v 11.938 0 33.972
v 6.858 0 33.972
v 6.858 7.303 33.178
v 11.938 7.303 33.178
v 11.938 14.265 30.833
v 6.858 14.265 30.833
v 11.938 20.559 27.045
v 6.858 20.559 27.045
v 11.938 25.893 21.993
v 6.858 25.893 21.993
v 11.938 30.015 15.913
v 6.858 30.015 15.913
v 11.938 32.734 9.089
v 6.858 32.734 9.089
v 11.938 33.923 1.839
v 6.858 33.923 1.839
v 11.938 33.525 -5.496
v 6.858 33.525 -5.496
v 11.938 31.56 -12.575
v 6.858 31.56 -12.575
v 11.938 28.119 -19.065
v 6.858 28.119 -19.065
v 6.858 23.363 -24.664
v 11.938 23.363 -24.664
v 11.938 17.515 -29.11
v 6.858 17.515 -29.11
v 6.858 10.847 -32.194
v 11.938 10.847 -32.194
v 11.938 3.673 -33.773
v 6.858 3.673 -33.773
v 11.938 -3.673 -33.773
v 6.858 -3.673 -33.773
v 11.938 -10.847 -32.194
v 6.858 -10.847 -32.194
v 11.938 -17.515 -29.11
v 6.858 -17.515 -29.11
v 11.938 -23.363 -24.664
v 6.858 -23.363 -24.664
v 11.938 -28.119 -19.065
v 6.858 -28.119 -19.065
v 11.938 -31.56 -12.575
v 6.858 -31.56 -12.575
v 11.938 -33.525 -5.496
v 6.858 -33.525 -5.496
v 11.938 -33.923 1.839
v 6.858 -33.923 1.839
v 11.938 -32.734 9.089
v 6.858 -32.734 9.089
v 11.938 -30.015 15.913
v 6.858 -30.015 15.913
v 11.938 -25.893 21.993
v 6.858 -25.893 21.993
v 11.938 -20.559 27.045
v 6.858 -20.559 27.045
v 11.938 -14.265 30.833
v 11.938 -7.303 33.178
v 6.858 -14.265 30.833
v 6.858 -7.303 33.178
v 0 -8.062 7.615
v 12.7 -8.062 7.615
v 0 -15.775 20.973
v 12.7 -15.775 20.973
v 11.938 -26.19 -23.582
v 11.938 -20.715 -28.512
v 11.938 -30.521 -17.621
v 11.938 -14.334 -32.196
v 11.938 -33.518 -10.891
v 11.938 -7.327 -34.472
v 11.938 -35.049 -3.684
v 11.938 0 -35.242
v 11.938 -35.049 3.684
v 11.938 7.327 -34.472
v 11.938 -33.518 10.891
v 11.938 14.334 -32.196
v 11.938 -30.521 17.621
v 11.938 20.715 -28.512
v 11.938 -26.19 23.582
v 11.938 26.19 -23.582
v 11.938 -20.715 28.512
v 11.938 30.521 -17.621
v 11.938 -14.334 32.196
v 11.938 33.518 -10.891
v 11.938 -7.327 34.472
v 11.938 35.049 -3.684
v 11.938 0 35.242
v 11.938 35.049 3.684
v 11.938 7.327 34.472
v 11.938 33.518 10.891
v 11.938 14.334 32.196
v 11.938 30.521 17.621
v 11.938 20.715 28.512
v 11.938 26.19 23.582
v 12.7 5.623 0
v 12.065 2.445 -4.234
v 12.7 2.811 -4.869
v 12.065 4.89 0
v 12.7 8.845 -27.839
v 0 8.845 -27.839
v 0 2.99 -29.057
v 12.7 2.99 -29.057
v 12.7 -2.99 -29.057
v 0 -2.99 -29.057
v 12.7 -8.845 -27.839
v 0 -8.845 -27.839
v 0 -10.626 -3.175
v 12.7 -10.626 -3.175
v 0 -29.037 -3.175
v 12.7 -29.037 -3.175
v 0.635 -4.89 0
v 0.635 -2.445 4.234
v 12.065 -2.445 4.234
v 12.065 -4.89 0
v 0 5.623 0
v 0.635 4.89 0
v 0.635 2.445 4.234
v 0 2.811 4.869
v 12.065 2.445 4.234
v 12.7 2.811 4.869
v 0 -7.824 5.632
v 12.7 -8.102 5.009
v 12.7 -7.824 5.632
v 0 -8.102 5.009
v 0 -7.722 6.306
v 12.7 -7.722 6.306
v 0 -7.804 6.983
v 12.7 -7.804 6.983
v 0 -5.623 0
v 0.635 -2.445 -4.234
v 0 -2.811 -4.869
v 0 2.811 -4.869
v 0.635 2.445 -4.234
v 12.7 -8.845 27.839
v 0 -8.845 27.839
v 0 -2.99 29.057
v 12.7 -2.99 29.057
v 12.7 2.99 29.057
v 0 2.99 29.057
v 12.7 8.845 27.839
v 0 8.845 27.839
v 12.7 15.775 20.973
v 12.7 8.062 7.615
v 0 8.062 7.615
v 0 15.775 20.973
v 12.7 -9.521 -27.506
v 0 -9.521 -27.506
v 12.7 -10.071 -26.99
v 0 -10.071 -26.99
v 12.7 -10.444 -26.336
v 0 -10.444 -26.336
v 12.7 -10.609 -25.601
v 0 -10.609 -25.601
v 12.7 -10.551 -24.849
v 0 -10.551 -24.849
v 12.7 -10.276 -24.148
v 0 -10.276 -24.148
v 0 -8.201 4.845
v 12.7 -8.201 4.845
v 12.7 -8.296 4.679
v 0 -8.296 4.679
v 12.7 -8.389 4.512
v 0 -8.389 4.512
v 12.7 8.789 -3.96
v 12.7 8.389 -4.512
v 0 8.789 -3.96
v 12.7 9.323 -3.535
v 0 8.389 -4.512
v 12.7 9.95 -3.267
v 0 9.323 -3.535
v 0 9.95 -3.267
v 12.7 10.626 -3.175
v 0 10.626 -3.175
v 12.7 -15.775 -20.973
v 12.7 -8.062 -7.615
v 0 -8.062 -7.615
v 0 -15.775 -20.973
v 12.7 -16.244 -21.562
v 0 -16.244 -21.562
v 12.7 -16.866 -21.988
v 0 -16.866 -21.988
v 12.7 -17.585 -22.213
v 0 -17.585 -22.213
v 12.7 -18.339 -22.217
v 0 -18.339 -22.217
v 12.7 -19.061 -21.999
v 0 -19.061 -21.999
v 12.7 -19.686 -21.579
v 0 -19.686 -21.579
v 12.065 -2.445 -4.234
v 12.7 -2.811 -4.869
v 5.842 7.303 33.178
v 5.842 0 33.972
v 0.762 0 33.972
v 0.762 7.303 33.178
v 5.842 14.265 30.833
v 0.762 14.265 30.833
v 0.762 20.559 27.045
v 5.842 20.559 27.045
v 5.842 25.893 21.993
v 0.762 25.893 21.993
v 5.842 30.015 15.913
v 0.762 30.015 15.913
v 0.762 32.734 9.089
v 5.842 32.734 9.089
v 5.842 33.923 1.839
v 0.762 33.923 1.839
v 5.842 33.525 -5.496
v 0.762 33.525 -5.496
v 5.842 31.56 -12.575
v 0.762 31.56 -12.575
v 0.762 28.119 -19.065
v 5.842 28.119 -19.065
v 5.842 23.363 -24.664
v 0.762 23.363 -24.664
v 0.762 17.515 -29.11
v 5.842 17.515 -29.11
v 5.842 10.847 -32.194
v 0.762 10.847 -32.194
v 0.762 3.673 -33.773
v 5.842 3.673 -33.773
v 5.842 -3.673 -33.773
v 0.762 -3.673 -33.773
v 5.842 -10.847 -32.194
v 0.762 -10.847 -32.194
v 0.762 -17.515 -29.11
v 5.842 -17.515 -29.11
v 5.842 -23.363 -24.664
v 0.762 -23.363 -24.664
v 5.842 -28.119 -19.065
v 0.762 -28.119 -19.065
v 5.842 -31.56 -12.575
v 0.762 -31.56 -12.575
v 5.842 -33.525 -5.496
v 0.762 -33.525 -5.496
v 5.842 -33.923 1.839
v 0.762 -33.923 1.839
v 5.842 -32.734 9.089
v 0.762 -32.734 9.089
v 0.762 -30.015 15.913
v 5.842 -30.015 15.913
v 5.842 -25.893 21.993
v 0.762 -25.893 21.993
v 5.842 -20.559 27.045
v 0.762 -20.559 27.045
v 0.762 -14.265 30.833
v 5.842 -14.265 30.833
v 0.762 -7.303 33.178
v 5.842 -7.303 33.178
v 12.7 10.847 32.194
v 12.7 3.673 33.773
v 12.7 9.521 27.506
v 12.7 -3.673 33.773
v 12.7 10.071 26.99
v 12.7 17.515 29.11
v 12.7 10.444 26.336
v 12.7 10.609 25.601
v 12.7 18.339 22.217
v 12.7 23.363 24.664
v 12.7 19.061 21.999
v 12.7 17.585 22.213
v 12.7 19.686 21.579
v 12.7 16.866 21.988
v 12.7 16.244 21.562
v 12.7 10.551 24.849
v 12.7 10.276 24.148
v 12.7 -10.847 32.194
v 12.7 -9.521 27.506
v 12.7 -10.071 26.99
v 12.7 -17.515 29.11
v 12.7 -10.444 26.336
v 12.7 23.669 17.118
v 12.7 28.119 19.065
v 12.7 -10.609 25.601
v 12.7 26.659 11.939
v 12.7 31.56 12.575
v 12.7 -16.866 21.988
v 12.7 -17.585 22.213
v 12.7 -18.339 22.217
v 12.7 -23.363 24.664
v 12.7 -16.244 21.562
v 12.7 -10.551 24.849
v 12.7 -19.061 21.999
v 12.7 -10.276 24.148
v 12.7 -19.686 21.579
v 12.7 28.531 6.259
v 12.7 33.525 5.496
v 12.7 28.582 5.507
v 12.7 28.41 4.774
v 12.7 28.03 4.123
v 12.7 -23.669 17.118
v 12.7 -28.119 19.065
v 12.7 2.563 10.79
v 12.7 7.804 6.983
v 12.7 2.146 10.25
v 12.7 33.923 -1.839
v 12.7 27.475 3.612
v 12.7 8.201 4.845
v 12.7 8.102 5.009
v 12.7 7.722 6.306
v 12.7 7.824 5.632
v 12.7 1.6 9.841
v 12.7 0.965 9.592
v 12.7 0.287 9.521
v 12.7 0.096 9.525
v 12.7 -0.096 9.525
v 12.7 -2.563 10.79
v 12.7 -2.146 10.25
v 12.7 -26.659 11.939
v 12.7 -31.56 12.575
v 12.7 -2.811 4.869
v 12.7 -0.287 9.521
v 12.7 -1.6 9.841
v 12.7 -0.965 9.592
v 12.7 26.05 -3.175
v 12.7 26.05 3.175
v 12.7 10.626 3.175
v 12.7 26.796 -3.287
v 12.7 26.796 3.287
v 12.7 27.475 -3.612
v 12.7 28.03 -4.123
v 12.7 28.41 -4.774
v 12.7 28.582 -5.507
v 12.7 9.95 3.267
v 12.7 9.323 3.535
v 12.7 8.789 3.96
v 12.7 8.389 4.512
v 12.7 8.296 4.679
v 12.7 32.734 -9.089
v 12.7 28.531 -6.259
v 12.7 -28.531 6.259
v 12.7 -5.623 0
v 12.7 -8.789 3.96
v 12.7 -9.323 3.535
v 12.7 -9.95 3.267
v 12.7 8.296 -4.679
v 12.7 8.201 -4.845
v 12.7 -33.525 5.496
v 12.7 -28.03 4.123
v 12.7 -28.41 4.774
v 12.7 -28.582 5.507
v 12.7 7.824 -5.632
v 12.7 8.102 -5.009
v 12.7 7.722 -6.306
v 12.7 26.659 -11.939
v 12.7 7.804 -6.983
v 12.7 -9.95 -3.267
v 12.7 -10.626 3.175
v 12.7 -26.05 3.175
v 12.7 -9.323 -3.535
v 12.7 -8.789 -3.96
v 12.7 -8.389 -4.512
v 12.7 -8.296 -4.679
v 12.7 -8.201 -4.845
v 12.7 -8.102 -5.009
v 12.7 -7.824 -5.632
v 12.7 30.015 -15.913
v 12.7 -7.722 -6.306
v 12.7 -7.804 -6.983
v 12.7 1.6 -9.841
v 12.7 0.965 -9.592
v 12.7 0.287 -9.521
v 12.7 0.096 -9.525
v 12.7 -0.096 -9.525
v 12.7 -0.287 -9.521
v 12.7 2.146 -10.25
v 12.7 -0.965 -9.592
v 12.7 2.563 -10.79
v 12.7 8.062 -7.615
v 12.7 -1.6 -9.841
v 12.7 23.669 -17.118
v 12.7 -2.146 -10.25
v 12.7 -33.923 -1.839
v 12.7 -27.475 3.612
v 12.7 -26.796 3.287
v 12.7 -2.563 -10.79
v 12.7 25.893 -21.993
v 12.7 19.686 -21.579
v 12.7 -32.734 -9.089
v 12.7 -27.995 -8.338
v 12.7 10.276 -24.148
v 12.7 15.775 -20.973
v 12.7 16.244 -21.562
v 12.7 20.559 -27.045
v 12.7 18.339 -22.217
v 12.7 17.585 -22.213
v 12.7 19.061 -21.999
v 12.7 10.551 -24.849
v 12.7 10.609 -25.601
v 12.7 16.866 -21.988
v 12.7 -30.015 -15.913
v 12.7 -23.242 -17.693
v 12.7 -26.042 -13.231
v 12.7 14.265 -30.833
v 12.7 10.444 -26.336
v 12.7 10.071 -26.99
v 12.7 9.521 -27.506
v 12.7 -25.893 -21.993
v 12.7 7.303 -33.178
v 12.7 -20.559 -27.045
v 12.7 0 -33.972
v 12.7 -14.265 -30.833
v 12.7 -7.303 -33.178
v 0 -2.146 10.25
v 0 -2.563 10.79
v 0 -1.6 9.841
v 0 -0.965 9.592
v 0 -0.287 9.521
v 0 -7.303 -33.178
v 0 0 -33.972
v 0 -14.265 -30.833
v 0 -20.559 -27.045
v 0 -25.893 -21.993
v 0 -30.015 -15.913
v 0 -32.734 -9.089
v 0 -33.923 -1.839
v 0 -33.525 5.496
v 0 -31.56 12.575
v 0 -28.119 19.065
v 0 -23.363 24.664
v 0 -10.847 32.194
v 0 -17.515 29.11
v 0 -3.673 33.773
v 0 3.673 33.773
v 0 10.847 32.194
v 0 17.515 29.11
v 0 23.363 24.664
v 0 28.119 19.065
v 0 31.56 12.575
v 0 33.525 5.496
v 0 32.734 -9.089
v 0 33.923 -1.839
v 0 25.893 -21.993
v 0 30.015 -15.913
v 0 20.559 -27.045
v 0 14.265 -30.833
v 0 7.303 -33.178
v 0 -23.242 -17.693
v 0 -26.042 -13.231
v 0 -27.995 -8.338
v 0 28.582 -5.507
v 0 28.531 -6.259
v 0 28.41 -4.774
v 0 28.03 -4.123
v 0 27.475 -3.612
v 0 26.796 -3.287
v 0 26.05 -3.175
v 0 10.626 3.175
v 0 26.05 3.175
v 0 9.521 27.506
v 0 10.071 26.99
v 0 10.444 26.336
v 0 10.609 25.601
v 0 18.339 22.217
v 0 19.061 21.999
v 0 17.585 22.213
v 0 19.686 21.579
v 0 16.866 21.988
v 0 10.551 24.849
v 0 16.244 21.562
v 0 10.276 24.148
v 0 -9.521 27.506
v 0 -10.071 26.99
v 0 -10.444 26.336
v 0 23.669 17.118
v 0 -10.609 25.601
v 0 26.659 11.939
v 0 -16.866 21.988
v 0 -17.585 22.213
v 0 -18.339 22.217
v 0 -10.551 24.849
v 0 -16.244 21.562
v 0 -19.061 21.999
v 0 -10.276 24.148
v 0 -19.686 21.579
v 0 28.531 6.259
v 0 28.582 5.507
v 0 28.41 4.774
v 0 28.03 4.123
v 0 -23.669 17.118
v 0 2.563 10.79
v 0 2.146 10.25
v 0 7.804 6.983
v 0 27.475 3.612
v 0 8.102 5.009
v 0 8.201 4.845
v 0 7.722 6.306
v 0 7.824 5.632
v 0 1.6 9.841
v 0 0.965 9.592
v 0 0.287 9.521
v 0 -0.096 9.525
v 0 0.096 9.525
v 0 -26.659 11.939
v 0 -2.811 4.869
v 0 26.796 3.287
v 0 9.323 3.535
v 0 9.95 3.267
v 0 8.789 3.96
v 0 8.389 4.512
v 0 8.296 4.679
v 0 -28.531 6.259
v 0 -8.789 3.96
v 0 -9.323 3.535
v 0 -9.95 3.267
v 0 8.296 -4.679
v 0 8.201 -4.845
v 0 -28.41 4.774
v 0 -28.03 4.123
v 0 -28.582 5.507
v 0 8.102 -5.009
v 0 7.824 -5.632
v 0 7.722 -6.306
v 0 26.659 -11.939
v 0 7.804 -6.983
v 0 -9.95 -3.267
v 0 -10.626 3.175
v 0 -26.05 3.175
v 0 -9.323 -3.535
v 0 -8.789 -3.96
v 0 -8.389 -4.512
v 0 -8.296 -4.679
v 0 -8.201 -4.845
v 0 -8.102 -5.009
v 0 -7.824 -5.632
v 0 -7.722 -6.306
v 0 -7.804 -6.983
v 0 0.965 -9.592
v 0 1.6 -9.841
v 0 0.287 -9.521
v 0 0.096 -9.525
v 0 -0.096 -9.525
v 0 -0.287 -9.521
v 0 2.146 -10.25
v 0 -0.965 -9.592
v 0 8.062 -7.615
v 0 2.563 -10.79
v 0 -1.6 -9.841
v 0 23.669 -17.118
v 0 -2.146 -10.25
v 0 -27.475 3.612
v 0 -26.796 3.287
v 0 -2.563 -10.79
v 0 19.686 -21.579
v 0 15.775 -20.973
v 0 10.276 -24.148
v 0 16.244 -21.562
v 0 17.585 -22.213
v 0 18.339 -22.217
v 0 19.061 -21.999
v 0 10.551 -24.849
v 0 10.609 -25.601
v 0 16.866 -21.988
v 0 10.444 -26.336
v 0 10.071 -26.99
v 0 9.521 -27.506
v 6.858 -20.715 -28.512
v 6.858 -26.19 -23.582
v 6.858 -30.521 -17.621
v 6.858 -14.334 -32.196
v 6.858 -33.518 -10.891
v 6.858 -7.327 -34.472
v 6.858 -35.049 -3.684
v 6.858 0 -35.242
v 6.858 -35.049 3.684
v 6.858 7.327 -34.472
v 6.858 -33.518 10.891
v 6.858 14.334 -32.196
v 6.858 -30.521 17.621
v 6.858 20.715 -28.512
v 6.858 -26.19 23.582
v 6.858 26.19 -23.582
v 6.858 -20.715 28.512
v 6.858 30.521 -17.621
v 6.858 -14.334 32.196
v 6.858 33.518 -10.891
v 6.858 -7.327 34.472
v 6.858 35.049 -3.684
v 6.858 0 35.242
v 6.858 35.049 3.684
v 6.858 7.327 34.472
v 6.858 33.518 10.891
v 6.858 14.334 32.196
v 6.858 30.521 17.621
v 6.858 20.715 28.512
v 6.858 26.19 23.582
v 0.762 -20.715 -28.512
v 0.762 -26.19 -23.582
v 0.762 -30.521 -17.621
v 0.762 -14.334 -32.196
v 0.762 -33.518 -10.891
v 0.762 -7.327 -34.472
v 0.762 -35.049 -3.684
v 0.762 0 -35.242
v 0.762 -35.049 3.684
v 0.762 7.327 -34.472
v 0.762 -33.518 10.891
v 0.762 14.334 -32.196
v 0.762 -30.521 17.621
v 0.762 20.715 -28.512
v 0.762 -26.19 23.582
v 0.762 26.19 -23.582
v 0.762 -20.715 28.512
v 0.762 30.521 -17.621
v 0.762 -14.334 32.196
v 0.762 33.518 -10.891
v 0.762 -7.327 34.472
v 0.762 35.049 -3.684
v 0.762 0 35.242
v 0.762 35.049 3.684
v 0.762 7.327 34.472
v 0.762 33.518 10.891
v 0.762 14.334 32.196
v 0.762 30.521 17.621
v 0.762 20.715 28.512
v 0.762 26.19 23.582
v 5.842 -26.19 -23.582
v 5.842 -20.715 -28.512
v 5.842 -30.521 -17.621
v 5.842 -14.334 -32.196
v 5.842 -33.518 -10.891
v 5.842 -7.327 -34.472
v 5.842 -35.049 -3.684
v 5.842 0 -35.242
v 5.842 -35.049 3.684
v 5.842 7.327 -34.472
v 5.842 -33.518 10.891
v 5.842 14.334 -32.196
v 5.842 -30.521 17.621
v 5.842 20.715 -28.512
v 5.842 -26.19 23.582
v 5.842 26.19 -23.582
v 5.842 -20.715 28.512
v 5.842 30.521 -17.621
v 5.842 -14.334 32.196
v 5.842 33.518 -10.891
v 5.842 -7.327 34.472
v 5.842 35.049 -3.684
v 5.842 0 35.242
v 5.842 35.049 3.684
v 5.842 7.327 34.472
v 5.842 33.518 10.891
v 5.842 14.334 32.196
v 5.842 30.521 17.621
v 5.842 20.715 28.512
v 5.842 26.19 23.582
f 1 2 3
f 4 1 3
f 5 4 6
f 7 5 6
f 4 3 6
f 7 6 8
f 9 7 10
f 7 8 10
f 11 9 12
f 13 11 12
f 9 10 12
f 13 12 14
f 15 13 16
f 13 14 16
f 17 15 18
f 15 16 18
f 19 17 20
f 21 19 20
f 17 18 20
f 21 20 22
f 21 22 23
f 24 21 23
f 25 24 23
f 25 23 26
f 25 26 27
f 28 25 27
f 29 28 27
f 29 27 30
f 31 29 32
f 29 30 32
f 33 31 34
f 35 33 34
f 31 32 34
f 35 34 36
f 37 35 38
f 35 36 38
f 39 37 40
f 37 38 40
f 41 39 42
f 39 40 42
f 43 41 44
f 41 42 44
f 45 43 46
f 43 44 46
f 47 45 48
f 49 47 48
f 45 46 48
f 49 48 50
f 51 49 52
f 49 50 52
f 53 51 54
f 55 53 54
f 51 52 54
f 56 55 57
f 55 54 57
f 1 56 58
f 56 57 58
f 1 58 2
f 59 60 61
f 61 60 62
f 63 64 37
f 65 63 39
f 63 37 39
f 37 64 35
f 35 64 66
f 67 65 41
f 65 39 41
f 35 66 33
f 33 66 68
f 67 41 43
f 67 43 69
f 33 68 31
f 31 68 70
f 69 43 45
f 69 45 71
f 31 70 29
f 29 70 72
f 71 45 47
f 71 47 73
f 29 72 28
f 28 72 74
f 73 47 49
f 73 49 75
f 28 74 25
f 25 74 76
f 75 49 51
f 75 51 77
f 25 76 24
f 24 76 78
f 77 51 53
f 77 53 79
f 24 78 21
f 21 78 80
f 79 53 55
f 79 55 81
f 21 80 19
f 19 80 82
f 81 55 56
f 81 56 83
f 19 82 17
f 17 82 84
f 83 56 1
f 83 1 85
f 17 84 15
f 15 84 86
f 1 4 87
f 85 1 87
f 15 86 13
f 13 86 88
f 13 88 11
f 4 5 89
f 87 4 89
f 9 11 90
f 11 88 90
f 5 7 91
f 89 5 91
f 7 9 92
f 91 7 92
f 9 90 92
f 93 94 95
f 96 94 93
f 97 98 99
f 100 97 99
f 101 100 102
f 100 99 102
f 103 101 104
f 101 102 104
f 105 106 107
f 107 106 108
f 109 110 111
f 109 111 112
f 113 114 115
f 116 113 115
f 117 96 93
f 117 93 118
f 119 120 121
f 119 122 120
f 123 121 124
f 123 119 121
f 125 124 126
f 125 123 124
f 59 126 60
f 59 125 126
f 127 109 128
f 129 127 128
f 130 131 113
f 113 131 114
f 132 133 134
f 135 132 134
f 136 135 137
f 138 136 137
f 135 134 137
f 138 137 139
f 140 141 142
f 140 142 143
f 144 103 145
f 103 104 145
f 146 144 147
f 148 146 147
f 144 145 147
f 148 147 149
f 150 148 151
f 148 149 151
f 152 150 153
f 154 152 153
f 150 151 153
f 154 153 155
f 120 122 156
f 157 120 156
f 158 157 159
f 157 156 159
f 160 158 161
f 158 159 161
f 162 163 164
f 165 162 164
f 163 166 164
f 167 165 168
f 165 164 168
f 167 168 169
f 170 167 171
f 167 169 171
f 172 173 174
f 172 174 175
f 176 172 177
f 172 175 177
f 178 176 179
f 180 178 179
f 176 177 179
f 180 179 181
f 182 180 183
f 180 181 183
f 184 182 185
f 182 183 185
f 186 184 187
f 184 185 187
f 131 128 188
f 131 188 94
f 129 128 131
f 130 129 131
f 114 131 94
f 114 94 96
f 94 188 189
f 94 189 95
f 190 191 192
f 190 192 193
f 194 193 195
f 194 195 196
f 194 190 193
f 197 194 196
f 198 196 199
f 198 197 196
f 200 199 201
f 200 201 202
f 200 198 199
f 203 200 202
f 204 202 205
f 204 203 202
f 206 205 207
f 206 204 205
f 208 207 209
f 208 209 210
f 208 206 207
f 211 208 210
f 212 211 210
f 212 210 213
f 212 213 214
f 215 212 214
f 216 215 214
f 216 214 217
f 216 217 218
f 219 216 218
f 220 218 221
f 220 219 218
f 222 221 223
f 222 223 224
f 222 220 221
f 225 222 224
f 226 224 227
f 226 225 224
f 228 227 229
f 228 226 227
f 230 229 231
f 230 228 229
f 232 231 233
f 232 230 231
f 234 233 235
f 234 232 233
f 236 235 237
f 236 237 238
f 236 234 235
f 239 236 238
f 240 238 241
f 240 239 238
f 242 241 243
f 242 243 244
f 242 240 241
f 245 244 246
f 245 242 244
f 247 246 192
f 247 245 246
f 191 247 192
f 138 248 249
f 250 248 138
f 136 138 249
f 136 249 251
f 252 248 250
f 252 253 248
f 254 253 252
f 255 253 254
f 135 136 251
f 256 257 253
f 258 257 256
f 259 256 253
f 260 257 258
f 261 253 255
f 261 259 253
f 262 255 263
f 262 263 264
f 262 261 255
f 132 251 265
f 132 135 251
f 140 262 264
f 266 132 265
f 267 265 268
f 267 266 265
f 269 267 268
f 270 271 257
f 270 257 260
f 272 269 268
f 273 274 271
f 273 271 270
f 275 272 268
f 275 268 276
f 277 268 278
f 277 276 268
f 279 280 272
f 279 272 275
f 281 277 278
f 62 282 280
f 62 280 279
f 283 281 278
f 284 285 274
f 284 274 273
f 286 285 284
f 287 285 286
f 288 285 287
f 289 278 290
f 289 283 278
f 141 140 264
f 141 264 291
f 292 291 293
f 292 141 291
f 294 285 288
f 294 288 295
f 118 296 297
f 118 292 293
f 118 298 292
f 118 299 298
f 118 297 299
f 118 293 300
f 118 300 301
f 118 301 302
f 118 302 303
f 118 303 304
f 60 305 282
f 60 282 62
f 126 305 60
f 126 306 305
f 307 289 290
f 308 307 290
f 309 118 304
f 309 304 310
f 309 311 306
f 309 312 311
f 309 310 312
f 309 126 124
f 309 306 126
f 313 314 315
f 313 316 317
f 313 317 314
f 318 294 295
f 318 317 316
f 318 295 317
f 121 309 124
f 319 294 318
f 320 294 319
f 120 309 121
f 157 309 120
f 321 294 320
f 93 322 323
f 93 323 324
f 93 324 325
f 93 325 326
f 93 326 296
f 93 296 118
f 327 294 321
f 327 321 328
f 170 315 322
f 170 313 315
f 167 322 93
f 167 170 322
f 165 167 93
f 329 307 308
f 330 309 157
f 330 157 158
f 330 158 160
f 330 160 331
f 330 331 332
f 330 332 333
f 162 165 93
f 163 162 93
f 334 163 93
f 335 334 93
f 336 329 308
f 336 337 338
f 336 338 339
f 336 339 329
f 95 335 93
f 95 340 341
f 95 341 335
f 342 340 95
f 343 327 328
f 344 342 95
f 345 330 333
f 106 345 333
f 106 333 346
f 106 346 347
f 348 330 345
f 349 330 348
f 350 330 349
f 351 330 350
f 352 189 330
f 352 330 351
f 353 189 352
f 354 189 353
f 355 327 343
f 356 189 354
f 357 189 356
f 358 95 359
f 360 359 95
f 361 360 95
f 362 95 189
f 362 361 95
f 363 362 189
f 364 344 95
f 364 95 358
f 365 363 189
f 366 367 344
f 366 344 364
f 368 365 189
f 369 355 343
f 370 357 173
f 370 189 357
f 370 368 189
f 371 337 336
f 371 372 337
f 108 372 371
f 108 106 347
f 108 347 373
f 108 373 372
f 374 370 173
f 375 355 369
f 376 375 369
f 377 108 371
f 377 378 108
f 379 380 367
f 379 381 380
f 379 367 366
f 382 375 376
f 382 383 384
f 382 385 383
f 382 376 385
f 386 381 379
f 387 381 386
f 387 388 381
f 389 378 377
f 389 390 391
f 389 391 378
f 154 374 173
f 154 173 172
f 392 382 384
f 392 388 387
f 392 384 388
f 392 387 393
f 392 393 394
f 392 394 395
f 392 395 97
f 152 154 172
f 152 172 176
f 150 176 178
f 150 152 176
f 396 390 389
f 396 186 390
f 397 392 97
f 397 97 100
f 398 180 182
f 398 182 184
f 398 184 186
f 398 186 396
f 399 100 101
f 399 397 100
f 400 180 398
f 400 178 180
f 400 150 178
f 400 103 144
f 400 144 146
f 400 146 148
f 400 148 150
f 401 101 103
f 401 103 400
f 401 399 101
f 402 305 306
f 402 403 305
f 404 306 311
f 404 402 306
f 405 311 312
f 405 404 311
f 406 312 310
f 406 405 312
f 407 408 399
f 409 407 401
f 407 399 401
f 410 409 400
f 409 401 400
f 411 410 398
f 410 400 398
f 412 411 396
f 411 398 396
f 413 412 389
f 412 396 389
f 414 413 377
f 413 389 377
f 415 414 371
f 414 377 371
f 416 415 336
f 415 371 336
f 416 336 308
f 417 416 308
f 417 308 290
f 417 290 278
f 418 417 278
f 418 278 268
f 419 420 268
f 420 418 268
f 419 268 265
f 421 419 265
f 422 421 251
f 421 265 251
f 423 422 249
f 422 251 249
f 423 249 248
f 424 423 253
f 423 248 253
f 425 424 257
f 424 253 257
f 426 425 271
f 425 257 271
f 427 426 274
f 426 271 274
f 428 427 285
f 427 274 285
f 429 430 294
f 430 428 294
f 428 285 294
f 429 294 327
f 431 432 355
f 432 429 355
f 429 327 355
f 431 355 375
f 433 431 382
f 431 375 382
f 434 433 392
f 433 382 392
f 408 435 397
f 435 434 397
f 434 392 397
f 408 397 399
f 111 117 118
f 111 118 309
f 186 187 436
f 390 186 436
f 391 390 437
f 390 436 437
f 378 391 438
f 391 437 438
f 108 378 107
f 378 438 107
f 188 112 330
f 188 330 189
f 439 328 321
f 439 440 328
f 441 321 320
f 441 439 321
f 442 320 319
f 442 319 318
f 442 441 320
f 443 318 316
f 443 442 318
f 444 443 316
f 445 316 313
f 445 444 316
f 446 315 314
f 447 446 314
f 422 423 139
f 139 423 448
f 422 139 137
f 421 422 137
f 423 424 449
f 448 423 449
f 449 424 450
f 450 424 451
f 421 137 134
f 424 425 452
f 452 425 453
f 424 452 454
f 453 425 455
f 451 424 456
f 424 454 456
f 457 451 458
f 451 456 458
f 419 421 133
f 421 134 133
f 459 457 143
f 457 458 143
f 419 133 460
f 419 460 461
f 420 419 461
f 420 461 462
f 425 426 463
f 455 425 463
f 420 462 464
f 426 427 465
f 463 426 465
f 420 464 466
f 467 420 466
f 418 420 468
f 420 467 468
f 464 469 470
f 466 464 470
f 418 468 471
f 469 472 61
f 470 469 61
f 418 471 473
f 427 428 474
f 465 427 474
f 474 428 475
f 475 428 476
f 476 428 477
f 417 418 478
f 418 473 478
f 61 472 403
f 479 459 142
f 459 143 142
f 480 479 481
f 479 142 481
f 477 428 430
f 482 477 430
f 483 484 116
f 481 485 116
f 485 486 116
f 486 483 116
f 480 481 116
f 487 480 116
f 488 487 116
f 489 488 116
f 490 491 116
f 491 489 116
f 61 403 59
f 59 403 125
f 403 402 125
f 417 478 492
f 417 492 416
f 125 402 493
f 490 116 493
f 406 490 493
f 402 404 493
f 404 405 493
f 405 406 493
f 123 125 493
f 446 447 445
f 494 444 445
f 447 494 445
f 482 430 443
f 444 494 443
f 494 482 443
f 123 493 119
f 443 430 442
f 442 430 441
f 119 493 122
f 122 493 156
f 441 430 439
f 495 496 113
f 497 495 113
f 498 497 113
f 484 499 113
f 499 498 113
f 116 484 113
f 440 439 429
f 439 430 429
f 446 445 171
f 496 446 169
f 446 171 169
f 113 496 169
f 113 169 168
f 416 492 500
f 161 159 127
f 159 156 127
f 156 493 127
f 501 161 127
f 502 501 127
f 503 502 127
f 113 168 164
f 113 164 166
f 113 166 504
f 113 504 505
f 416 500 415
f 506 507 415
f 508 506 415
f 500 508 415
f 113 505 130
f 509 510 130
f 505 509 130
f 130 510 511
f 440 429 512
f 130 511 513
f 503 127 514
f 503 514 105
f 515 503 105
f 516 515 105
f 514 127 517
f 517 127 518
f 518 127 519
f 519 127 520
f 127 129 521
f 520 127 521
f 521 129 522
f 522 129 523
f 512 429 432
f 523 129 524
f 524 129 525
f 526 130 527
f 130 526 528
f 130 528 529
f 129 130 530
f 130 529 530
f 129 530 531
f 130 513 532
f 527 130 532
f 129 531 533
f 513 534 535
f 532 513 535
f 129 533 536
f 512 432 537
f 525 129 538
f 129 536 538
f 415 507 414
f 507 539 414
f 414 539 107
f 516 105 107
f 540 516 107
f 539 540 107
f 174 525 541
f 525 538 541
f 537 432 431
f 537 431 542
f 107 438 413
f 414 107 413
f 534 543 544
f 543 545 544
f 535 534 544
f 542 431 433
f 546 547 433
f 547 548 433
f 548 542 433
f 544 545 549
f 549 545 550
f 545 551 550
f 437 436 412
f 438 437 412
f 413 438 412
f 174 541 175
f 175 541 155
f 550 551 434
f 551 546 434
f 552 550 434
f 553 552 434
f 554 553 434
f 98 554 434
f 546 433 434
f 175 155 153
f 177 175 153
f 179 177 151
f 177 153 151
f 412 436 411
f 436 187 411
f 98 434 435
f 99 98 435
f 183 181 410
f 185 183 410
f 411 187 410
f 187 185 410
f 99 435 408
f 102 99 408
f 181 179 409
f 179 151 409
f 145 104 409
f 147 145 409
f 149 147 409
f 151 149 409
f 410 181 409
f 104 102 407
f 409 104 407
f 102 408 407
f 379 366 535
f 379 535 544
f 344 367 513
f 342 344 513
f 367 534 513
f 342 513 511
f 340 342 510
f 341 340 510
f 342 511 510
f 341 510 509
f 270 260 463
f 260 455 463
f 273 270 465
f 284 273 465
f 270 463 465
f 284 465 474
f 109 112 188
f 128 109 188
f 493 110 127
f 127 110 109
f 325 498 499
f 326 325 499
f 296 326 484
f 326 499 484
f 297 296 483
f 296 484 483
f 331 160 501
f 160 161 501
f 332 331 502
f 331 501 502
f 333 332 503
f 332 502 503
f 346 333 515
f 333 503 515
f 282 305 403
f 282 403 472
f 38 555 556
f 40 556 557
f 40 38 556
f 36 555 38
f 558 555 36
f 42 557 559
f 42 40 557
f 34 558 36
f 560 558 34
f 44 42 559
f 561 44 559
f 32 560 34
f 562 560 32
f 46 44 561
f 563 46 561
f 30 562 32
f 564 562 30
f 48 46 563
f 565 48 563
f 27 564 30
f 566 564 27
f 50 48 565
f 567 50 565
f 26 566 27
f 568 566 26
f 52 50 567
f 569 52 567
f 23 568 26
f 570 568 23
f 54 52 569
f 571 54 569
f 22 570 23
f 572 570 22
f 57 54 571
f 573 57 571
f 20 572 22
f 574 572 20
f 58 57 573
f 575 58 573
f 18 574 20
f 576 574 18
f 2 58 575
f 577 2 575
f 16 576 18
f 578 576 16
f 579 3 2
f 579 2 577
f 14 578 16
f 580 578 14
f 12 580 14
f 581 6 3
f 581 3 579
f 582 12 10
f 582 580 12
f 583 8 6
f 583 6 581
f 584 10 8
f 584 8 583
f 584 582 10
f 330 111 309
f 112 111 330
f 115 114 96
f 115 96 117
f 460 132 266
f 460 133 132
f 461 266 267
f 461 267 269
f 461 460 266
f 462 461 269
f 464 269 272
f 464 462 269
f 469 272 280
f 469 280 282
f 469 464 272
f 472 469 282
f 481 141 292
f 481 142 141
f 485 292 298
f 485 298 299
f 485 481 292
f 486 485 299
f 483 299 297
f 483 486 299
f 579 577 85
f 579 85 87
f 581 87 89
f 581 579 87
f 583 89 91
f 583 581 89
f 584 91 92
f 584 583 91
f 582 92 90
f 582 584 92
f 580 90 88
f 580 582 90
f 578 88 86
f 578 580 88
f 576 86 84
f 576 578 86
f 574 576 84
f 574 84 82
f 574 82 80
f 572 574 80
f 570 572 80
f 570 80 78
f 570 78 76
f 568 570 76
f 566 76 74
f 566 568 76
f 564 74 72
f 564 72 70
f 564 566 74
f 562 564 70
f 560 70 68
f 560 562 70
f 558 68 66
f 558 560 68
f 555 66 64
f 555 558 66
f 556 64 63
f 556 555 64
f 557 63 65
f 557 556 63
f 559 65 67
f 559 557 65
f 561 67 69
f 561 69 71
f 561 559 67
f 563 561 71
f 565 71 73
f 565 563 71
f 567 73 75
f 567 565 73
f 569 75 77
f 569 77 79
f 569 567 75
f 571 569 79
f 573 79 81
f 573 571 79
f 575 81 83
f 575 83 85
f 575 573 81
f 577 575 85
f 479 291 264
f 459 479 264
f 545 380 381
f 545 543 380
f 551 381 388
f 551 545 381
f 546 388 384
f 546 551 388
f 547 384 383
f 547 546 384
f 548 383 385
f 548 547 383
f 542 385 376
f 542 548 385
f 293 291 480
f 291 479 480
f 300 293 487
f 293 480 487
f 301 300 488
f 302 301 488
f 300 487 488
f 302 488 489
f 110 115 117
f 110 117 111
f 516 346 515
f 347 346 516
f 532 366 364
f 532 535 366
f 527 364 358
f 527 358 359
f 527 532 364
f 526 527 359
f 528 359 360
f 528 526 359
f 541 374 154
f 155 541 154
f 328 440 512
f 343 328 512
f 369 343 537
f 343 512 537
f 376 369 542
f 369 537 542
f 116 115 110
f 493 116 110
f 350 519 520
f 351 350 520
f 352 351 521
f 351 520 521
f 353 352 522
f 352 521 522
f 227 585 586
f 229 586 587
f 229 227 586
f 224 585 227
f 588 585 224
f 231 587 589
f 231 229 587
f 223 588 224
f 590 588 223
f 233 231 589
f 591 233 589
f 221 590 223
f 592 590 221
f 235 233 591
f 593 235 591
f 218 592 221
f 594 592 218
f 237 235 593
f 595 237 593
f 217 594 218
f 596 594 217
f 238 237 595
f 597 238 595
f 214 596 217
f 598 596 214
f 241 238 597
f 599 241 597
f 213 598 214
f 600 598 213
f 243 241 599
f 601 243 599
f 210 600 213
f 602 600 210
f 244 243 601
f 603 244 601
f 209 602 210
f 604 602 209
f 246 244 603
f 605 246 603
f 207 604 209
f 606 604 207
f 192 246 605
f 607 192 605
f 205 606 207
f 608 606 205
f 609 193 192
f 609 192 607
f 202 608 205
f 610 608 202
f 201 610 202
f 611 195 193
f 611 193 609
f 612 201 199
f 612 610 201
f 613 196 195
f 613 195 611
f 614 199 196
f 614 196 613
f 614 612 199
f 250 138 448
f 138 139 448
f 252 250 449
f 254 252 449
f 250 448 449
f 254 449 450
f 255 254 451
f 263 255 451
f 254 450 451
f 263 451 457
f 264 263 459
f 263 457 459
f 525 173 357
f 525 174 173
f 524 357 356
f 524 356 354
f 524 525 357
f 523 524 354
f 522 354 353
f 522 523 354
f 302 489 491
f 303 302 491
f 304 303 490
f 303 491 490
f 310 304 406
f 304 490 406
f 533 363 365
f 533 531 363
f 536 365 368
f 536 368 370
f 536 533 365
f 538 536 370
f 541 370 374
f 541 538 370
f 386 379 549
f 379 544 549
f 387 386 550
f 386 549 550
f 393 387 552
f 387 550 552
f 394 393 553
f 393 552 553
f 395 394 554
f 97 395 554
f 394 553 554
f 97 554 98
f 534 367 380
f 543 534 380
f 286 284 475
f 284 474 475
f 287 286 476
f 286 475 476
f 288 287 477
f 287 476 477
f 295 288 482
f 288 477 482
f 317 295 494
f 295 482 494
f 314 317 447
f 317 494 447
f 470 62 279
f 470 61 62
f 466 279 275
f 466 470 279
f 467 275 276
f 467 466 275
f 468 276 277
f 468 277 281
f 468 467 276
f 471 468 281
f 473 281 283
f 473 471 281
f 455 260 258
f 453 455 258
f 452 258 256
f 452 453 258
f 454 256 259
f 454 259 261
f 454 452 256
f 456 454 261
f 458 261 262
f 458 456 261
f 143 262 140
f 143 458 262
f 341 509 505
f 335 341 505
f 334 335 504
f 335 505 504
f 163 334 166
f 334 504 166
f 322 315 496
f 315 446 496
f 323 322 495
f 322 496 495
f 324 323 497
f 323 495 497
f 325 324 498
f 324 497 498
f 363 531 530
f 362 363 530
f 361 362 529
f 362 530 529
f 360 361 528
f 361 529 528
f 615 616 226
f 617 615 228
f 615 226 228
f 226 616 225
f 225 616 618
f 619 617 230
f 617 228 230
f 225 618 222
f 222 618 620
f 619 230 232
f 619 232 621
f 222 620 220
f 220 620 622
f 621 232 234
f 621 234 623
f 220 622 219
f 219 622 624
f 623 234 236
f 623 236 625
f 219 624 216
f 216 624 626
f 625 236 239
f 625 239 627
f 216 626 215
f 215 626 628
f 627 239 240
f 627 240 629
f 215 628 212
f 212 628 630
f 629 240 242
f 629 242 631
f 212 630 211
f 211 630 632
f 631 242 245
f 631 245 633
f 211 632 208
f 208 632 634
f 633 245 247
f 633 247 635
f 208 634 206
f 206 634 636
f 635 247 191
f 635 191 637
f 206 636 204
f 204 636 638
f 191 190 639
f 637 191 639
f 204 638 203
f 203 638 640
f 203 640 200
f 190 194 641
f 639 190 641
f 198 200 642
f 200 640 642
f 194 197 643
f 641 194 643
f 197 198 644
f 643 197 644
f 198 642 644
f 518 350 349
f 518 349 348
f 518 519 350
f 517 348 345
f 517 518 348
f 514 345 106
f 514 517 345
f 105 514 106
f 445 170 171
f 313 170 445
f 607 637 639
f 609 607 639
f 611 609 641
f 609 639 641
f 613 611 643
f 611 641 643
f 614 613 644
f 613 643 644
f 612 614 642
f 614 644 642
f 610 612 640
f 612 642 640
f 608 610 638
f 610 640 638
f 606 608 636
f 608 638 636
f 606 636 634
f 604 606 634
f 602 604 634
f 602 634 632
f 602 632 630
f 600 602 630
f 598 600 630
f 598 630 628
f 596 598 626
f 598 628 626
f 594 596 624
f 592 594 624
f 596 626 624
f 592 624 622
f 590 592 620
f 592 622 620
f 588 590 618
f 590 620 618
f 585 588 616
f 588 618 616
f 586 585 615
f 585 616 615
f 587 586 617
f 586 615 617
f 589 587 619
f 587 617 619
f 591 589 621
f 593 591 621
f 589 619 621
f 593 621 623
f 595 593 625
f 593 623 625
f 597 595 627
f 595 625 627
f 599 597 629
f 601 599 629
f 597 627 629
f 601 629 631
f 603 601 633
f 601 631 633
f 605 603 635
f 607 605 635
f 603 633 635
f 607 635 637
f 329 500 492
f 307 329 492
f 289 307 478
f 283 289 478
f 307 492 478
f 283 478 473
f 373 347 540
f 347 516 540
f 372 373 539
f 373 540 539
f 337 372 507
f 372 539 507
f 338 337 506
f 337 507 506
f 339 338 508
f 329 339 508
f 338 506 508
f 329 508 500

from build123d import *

# Parameters (mm, degrees)
AXLE_PROFILE_R              = 9.525
WHEEL_HUB_DEPTH             = 12.7
WHEEL_RIM_REACH             = 16.892
SKETCH3_R                   = 33.9725
SKETCH3_R_2                 = 29.21
WHEEL_RIM_DIRECTION_2_REACH = 16.892
SKETCH4_W                   = 6.35
SKETCH4_H                   = 20.229743879
BOSS_EXTRUDE1_DEPTH         = 12.7
SPOKES_COUNT                = 6
SPOKE_FILLETS_R             = 2.54
SHAFT_CHAMFERS_SIZE         = 0.635
EXTRUDE_THIN1_START         = 0.508
SKETCH6_R                   = 35.2425
SKETCH6_R_2                 = 33.9725
EXTRUDE_THIN1_DEPTH         = 5.08


with BuildPart() as part:
    # Axle Profile → Wheel Hub (new body)
    with BuildSketch(Plane(origin=(0, 0, 0), x_dir=(0, 0, -1), z_dir=(1, 0, 0))):
        Circle(AXLE_PROFILE_R)
        Polygon((0, -4.8895), (4.234431212, -2.44475), (4.234431212, 2.44475), (0, 4.8895), (-4.234431212, 2.44475), (-4.234431212, -2.44475), align=None, mode=Mode.SUBTRACT)
    extrude(amount=WHEEL_HUB_DEPTH)

    # Wheel Rim: up to this face of the body (flat: up to its plane)
    wheel_rim_end = Plane(part.part.faces().sort_by_distance((0, 0, 9.255592316))[0])
    # Sketch3 → Wheel Rim (add, up to the picked face)
    with BuildSketch(Plane.ZY.offset(-6.35), mode=Mode.PRIVATE) as wheel_rim_sk1:
        with Locations(Location((0, 0, 0), (0, 0, 180))):
            Circle(SKETCH3_R)
        with Locations(Location((0, 0, 0), (0, 0, 180))):
            Circle(SKETCH3_R_2, mode=Mode.SUBTRACT)
    wheel_rim_tool1 = split(extrude(wheel_rim_sk1.sketch, amount=WHEEL_RIM_REACH, mode=Mode.PRIVATE), bisect_by=wheel_rim_end, keep=Keep.BOTH, mode=Mode.PRIVATE)
    add(wheel_rim_tool1.solids().sort_by(Axis((6.35, 0, 33.011613), (-1, 0, 0)))[0])

    # Wheel Rim direction 2: up to this face of the body (flat: up to its plane)
    wheel_rim_direction_2_end = Plane(part.part.faces().sort_by_distance((12.7, 0, 9.255592316))[0])
    # Sketch3 → Wheel Rim direction 2 (add, up to the picked face)
    with BuildSketch(Plane.ZY.offset(-6.35), mode=Mode.PRIVATE) as wheel_rim_direction_2_sk1:
        with Locations(Location((0, 0, 0), (0, 0, 180))):
            Circle(SKETCH3_R)
        with Locations(Location((0, 0, 0), (0, 0, 180))):
            Circle(SKETCH3_R_2, mode=Mode.SUBTRACT)
    wheel_rim_direction_2_tool1 = split(extrude(wheel_rim_direction_2_sk1.sketch, amount=-WHEEL_RIM_DIRECTION_2_REACH, mode=Mode.PRIVATE), bisect_by=wheel_rim_direction_2_end, keep=Keep.BOTH, mode=Mode.PRIVATE)
    add(wheel_rim_direction_2_tool1.solids().sort_by(Axis((6.35, 0, 33.011613), (1, 0, 0)))[0])

    # Sketch4 → Boss-Extrude1 (add)
    with BuildSketch(Plane(origin=(12.7, 0, 0), x_dir=(0, 0, -1), z_dir=(1, 0, 0))):
        with Locations((0, 19.095128061)):
            Rectangle(SKETCH4_W, SKETCH4_H)
    boss_extrude1 = extrude(amount=-BOSS_EXTRUDE1_DEPTH)

    # Spokes: Boss-Extrude1 ×6 about axis
    spokes_axis = Axis((0, 0, 0), (1, 0, 0))
    for i in range(1, SPOKES_COUNT):
        add(boss_extrude1.rotate(spokes_axis, i * 360 / SPOKES_COUNT))

    # Spoke Fillets
    spoke_fillets_edges = [part.edges().sort_by_distance(p)[0] for p in [
        (6.35, 7.239758718, -6.189629933),
        (6.35, 1.740497404, -9.364629933),
        (6.35, -1.740497404, -9.364629933),
        (6.35, -7.239758718, -6.189629933),
        (6.35, -8.980256121, -3.175),
        (6.35, -8.980256121, 3.175),
        (6.35, -7.239758718, 6.189629933),
        (6.35, -1.740497404, 9.364629933),
        (6.35, 1.740497404, 9.364629933),
        (6.35, 7.239758718, 6.189629933),
        (6.35, 8.980256121, 3.175),
        (6.35, 8.980256121, -3.175),
        (9.525, 29.036932948, -3.175),
        (9.525, 29.036932948, 3.175),
        (3.175, 17.268097131, 23.559221581),
        (3.175, 11.768835817, 26.734221581),
        (9.525, -11.768835817, 26.734221581),
        (9.525, -17.268097131, 23.559221581),
        (9.525, -29.036932948, 3.175),
        (3.175, -17.268097131, -23.559221581),
        (3.175, -11.768835817, -26.734221581),
        (9.525, 11.768835817, -26.734221581),
        (3.175, 17.268097131, -23.559221581),
    ]]
    fillet(spoke_fillets_edges, radius=SPOKE_FILLETS_R)

    # Shaft Chamfers
    shaft_chamfers_edges = [part.edges().sort_by_distance(p)[0] for p in [
        (0, 0, -4.234431212),
        (0, 3.667125, -2.117215606),
        (0, 3.667125, 2.117215606),
        (0, 0, 4.234431212),
        (12.7, -3.667125, 2.117215606),
        (12.7, -3.667125, -2.117215606),
        (12.7, 0, -4.234431212),
        (12.7, 3.667125, -2.117215606),
        (12.7, 3.667125, 2.117215606),
        (12.7, 0, 4.234431212),
        (0, -3.667125, 2.117215606),
        (0, -3.667125, -2.117215606),
    ]]
    chamfer(shaft_chamfers_edges, length=SHAFT_CHAMFERS_SIZE)


with BuildPart() as body_2:
    # Sketch6 → Extrude-Thin1 (new body)
    with BuildSketch(Plane.ZY.offset(-6.35).offset(EXTRUDE_THIN1_START)):
        Circle(SKETCH6_R)
        Circle(SKETCH6_R_2, mode=Mode.SUBTRACT)
    extrude(amount=EXTRUDE_THIN1_DEPTH)


with BuildPart() as body_3:
    # Mirror1: mirrored copy
    add(body_2.part.mirror(Plane.ZY.offset(-6.35)))


solid = Compound([part.part, body_2.part, body_3.part])
